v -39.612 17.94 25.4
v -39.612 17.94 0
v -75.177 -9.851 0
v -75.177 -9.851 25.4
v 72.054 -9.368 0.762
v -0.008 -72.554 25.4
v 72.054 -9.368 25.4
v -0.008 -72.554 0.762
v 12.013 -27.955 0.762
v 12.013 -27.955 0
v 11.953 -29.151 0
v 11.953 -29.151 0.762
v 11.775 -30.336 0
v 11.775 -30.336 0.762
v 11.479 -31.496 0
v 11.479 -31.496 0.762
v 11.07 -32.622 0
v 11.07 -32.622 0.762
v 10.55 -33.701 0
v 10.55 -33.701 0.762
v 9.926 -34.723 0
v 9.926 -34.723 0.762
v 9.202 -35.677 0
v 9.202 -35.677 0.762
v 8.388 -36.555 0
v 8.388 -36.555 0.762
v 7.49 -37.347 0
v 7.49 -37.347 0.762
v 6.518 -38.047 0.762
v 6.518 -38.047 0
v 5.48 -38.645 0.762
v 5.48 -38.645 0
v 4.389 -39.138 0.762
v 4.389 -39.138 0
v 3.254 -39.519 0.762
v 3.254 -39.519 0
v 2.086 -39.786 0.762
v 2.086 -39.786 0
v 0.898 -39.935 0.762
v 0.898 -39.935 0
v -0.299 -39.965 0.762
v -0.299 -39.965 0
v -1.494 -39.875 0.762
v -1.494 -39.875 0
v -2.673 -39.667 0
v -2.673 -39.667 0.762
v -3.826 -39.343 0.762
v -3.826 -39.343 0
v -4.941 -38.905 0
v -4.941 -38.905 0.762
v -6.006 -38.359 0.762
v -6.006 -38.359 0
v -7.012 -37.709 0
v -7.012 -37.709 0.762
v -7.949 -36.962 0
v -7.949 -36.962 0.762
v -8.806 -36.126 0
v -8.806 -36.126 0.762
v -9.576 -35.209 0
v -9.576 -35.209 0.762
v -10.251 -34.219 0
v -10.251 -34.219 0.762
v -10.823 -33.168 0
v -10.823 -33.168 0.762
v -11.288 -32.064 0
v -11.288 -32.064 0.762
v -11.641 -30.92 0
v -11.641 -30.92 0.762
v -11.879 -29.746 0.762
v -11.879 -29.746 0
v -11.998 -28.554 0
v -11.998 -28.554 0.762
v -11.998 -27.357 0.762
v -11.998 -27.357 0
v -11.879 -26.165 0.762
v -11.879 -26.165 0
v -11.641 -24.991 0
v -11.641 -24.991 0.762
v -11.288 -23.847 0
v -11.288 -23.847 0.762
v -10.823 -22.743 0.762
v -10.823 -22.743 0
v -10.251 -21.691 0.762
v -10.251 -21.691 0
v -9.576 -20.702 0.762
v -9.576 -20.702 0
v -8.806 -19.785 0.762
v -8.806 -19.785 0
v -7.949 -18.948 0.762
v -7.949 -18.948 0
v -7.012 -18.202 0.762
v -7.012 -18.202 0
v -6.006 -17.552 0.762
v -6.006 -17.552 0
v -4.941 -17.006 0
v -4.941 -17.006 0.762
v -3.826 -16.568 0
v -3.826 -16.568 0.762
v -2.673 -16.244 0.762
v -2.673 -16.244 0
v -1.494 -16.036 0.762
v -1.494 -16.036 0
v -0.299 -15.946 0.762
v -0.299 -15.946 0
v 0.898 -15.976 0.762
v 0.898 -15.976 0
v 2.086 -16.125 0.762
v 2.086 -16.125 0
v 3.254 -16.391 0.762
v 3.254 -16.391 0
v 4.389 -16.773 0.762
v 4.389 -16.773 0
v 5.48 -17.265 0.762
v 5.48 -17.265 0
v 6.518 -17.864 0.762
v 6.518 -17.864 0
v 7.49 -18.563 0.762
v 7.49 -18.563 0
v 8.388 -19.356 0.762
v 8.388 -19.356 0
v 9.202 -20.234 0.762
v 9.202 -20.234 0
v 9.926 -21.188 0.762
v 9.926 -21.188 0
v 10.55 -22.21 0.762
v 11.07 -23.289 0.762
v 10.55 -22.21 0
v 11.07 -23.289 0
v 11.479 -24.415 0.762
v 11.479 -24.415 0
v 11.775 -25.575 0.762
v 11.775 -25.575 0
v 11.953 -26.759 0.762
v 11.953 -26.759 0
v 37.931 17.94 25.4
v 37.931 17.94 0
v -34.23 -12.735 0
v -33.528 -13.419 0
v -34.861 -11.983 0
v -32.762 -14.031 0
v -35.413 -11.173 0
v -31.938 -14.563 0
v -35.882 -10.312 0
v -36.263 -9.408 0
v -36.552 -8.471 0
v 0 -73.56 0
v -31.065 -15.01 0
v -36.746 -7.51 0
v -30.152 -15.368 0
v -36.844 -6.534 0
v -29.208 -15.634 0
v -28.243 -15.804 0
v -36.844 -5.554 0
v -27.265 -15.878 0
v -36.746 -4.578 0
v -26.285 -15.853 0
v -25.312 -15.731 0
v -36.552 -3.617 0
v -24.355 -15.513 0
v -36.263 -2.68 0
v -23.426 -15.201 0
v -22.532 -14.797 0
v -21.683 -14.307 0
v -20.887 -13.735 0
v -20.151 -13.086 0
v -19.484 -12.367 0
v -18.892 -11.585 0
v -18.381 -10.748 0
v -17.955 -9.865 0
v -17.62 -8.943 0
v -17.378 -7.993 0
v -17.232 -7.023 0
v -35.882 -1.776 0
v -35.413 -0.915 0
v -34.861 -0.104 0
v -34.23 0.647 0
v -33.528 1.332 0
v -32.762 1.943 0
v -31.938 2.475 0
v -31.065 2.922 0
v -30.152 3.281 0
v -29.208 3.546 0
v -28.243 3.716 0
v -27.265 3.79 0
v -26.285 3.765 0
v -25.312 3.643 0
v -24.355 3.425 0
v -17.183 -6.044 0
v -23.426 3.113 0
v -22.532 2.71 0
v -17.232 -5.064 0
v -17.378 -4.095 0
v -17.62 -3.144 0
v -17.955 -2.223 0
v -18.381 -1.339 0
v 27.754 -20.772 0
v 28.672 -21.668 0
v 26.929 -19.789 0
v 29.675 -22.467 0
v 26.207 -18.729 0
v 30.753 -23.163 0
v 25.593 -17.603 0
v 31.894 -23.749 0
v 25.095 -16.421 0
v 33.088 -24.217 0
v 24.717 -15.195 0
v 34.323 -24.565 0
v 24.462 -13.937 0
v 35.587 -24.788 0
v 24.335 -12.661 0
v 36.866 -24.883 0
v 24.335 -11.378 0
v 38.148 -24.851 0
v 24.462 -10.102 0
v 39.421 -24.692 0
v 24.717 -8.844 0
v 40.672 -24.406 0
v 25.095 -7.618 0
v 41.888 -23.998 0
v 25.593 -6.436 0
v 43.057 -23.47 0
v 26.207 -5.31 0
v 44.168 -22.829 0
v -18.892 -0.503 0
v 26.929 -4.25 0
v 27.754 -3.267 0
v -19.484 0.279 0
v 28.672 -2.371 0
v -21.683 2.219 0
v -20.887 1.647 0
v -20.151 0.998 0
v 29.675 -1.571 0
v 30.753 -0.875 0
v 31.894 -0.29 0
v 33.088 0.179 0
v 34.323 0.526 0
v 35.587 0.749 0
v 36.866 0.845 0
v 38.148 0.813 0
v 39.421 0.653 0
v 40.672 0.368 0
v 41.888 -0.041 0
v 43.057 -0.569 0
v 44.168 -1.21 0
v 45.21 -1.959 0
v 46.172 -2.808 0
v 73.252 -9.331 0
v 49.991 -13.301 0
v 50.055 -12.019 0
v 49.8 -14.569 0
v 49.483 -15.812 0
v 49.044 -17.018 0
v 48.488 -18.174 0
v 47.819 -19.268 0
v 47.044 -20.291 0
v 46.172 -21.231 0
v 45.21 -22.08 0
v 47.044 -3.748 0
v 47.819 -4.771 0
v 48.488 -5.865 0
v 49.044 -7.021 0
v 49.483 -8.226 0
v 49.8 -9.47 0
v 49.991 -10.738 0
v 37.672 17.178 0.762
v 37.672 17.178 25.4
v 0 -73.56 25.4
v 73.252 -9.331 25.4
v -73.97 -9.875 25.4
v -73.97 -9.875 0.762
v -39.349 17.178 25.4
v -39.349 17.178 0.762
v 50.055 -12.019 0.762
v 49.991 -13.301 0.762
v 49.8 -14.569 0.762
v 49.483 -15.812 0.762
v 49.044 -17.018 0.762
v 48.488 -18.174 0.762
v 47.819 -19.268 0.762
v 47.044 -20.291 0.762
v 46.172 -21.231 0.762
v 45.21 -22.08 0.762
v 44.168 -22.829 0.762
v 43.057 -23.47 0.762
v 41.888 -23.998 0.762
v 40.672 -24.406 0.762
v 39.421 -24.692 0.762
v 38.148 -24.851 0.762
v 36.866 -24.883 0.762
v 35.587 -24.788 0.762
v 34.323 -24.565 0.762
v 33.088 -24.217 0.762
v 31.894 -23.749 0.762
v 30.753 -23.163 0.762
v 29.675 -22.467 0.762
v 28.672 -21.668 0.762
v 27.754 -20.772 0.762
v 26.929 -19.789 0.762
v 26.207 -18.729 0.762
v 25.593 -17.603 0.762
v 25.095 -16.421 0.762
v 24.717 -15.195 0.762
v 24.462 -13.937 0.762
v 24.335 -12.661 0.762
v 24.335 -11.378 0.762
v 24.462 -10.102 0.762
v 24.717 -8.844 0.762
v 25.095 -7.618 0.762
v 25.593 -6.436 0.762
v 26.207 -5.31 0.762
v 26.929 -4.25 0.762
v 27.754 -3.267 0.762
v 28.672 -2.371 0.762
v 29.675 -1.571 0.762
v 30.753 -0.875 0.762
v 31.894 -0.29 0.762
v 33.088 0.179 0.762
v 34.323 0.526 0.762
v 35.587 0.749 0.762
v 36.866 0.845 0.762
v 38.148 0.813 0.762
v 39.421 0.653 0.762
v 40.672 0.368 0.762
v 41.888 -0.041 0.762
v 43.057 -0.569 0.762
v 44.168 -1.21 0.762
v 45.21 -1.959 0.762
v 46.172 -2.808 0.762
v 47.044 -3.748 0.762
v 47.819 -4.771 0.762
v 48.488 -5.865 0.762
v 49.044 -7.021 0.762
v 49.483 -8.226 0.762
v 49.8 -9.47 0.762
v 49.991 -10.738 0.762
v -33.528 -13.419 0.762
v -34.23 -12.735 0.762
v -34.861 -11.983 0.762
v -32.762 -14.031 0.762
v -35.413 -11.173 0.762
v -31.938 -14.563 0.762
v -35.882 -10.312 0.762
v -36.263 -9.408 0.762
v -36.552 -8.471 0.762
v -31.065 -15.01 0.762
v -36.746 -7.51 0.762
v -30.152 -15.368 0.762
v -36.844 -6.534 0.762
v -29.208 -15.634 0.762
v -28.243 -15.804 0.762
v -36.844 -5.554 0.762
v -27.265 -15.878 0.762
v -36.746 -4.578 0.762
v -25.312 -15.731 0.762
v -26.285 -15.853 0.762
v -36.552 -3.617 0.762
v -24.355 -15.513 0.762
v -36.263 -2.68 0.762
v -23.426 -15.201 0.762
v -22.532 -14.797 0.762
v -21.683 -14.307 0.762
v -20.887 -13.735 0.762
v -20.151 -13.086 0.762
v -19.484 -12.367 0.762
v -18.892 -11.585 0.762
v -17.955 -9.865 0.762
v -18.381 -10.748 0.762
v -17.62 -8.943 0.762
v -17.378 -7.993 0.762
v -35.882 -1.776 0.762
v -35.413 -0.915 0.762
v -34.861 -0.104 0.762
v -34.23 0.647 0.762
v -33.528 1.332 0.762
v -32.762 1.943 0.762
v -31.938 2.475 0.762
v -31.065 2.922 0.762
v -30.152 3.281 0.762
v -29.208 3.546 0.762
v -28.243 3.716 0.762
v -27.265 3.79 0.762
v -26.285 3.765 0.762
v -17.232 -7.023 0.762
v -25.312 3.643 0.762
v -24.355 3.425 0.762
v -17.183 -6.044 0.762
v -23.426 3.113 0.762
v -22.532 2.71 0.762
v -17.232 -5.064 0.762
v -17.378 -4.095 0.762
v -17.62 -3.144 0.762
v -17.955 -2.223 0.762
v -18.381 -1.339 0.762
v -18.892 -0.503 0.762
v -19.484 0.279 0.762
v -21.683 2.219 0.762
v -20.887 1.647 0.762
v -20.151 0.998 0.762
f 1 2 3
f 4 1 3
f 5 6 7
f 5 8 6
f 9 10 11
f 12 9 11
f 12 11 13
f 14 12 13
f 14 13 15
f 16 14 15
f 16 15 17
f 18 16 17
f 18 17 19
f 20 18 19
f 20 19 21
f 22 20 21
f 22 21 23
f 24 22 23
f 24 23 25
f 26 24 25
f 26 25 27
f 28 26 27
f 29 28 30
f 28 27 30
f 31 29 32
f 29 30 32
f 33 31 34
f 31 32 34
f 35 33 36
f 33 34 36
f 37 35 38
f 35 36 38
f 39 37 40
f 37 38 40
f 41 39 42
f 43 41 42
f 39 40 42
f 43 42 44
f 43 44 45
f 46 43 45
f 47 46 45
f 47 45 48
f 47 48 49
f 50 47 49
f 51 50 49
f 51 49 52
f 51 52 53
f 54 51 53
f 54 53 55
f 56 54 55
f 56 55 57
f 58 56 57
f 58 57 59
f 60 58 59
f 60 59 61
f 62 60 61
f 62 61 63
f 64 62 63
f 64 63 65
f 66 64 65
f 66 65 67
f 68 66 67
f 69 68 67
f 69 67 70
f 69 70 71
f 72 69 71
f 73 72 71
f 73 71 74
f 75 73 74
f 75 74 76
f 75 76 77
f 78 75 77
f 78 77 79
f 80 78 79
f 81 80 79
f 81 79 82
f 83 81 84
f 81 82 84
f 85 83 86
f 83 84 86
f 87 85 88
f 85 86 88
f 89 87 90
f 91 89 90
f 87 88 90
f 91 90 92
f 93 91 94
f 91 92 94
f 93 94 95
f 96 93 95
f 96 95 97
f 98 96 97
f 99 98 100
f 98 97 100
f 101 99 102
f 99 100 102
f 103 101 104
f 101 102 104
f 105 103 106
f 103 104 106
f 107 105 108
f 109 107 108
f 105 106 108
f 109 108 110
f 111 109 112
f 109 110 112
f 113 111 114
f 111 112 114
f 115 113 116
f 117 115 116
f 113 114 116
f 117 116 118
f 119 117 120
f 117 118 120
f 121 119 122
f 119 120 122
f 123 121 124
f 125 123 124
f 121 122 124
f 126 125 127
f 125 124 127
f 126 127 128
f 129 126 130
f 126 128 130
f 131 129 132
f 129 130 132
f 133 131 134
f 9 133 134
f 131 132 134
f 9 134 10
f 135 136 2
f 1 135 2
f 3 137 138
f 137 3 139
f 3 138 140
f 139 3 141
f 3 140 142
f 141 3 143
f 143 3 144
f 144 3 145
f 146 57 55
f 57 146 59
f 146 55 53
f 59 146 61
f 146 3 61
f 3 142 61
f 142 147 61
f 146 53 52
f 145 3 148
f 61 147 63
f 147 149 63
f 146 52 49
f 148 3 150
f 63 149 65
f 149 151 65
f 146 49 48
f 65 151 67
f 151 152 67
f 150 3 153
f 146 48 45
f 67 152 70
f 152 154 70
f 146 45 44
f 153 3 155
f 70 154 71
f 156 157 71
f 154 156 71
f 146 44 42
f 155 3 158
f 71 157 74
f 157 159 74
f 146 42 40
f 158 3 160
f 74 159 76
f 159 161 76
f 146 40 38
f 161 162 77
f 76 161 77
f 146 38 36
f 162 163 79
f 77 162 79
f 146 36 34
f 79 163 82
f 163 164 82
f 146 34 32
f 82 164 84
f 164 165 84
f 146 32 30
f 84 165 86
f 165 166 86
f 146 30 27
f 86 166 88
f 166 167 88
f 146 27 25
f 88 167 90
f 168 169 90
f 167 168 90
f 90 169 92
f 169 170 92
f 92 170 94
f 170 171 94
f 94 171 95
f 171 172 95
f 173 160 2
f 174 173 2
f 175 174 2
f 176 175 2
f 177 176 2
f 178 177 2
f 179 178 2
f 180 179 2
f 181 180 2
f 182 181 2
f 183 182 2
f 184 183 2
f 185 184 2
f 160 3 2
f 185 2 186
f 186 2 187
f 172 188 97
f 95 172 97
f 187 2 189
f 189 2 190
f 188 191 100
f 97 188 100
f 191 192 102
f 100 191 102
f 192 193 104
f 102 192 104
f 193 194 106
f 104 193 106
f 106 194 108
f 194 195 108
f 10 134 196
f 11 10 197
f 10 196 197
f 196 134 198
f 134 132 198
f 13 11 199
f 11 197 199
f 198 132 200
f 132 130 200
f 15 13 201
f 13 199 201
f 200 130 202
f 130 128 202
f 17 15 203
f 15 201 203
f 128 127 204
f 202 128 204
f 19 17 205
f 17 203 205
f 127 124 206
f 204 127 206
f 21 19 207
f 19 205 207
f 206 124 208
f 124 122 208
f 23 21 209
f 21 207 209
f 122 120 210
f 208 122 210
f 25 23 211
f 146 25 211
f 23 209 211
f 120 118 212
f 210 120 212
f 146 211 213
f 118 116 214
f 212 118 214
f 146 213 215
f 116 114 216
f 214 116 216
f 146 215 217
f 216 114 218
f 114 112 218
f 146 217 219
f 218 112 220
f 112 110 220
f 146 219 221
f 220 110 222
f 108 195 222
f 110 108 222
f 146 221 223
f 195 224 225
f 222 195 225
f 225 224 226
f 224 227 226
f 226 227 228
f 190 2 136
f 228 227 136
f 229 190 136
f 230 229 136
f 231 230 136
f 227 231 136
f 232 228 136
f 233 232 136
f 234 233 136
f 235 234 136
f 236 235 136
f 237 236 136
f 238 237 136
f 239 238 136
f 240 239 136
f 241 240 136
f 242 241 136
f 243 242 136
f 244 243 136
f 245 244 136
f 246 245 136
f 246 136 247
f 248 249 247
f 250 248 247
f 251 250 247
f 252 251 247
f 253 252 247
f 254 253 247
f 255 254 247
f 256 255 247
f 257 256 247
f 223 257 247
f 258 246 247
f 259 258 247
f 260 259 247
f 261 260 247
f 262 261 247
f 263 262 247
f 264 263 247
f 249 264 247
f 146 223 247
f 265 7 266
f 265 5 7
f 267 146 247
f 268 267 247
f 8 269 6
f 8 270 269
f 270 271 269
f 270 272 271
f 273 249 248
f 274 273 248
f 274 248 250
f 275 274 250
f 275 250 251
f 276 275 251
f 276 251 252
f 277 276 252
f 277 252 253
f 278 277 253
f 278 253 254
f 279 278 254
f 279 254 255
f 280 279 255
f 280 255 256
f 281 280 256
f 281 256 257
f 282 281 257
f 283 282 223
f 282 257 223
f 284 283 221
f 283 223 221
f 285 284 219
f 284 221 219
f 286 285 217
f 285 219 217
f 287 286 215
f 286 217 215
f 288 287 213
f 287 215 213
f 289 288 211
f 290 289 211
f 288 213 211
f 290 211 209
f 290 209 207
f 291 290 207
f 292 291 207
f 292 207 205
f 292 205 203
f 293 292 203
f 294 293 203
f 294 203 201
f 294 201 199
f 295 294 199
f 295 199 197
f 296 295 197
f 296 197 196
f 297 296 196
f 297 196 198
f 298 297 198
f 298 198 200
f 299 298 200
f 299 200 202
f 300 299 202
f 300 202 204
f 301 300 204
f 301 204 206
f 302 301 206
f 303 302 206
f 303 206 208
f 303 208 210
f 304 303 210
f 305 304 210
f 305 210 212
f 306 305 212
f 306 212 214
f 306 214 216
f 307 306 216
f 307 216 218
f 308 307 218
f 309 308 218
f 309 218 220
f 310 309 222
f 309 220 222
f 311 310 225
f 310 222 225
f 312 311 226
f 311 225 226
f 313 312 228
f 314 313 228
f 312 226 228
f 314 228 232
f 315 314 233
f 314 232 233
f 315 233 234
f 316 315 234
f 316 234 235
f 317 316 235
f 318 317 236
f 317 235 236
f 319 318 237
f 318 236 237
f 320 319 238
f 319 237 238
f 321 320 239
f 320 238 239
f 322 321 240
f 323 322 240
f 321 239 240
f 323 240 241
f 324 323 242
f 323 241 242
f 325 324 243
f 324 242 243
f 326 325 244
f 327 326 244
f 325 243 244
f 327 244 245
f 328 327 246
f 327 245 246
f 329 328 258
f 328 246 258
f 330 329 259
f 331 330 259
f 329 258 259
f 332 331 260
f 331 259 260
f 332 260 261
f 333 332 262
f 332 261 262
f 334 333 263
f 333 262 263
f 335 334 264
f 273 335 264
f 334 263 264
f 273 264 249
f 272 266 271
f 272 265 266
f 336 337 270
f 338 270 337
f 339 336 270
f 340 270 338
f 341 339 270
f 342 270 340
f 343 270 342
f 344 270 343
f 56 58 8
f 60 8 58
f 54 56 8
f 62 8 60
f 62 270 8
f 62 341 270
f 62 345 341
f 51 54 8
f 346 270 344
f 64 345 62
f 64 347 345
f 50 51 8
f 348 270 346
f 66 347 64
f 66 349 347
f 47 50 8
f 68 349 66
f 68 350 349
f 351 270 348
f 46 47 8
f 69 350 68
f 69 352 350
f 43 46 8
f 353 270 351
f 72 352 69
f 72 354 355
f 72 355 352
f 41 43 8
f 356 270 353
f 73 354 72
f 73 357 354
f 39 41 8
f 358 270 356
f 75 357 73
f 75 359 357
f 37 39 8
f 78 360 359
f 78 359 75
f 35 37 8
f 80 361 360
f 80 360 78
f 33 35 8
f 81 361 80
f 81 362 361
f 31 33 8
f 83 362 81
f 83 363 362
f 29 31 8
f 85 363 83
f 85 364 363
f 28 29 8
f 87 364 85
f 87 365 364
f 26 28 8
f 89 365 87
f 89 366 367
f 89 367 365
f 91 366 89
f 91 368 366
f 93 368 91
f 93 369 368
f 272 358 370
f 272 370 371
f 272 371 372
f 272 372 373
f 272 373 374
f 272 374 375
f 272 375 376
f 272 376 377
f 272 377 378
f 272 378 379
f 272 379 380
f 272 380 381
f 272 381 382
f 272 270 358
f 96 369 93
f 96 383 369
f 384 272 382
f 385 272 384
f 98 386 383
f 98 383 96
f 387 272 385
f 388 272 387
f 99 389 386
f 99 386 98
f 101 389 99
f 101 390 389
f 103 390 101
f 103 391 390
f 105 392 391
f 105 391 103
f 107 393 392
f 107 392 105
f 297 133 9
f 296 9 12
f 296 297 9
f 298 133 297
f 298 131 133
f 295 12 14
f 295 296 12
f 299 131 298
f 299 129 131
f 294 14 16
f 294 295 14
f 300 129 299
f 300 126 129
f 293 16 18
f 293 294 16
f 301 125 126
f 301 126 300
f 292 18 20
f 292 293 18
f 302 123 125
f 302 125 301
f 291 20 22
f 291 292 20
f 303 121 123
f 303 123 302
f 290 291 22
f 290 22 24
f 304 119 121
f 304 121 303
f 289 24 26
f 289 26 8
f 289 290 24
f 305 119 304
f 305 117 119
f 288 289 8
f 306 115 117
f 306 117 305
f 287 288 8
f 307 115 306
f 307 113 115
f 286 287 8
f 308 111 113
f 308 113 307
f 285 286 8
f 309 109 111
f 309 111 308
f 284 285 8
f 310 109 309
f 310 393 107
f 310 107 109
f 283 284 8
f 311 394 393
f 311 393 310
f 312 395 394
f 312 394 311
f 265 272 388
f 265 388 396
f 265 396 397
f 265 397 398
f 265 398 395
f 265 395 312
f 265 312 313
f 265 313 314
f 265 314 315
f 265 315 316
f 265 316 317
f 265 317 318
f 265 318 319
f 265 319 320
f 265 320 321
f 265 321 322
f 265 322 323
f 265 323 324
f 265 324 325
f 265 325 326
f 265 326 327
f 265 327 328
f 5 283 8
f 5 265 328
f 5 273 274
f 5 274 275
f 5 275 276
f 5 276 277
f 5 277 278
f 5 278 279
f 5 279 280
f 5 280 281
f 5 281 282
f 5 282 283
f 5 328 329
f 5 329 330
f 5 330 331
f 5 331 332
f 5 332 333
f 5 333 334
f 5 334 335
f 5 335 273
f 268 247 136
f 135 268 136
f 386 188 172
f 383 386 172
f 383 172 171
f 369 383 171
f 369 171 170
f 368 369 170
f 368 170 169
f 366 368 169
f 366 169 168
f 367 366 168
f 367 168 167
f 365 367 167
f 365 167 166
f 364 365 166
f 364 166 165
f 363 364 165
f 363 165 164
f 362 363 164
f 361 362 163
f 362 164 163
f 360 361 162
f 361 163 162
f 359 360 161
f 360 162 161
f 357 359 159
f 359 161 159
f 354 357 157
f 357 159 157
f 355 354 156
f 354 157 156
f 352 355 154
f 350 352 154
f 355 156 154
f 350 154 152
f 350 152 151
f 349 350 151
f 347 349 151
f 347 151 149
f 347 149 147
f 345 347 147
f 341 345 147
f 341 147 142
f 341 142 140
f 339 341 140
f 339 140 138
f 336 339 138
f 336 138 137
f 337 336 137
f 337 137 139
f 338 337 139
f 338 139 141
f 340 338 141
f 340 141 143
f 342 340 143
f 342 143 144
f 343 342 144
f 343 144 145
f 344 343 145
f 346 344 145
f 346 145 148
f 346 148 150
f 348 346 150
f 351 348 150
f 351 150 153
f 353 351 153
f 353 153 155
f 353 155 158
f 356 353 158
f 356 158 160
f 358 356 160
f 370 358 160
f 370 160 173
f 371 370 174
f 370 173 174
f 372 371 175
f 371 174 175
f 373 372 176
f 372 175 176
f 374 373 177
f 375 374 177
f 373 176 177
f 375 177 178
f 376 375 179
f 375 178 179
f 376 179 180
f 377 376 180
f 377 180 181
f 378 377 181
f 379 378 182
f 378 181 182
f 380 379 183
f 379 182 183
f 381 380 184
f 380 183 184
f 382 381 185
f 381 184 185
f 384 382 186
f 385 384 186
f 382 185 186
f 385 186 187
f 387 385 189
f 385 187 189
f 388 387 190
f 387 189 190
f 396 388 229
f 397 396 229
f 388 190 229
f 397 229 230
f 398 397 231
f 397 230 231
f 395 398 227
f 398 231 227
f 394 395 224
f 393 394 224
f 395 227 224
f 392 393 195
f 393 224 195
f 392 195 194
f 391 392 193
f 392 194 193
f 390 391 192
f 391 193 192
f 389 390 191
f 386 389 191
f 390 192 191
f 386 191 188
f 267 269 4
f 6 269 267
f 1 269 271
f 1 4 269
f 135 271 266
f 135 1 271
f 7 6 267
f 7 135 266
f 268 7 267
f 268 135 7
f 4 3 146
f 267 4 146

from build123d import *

# Parameters (mm, degrees)
F1_DEPTH = 25.4
F2_T     = -0.762
F3_R     = 12.012936
F4_DEPTH = 25.4
F5_R     = 12.868017
F5_R_2   = 9.8367
F6_DEPTH = 25.4


with BuildPart() as f1:
    # F0 (on Top) → F1 (new body)
    with BuildSketch(Plane.XY):
        Polygon((37.931472, 17.940195), (-39.611701, 17.940195), (-75.17679, -9.851208), (0, -73.559731), (73.252261, -9.331114), align=None)
    extrude(amount=F1_DEPTH)

    # F2
    f2_openings = [f1.faces().sort_by_distance(p)[0] for p in [
        (-0.795151, -17.594404, 25.4),
    ]]
    offset(amount=F2_T, openings=f2_openings)

    # F3 (on face) → F4 (cut)
    with BuildSketch(Plane(origin=(0, 0, 0), x_dir=(1, 0, 0), z_dir=(0, 0, -1))):
        with Locations((0, 27.955376)):
            Circle(F3_R)
    extrude(amount=-F4_DEPTH, mode=Mode.SUBTRACT)

    # F5 (on face) → F6 (cut)
    with BuildSketch(Plane(origin=(0, 0, 0), x_dir=(1, 0, 0), z_dir=(0, 0, -1))):
        with Locations((37.186667, 12.019401)):
            Circle(F5_R)
        with Locations((-27.019626, 6.043865)):
            Circle(F5_R_2)
    extrude(amount=-F6_DEPTH, mode=Mode.SUBTRACT)


solid = f1.part
